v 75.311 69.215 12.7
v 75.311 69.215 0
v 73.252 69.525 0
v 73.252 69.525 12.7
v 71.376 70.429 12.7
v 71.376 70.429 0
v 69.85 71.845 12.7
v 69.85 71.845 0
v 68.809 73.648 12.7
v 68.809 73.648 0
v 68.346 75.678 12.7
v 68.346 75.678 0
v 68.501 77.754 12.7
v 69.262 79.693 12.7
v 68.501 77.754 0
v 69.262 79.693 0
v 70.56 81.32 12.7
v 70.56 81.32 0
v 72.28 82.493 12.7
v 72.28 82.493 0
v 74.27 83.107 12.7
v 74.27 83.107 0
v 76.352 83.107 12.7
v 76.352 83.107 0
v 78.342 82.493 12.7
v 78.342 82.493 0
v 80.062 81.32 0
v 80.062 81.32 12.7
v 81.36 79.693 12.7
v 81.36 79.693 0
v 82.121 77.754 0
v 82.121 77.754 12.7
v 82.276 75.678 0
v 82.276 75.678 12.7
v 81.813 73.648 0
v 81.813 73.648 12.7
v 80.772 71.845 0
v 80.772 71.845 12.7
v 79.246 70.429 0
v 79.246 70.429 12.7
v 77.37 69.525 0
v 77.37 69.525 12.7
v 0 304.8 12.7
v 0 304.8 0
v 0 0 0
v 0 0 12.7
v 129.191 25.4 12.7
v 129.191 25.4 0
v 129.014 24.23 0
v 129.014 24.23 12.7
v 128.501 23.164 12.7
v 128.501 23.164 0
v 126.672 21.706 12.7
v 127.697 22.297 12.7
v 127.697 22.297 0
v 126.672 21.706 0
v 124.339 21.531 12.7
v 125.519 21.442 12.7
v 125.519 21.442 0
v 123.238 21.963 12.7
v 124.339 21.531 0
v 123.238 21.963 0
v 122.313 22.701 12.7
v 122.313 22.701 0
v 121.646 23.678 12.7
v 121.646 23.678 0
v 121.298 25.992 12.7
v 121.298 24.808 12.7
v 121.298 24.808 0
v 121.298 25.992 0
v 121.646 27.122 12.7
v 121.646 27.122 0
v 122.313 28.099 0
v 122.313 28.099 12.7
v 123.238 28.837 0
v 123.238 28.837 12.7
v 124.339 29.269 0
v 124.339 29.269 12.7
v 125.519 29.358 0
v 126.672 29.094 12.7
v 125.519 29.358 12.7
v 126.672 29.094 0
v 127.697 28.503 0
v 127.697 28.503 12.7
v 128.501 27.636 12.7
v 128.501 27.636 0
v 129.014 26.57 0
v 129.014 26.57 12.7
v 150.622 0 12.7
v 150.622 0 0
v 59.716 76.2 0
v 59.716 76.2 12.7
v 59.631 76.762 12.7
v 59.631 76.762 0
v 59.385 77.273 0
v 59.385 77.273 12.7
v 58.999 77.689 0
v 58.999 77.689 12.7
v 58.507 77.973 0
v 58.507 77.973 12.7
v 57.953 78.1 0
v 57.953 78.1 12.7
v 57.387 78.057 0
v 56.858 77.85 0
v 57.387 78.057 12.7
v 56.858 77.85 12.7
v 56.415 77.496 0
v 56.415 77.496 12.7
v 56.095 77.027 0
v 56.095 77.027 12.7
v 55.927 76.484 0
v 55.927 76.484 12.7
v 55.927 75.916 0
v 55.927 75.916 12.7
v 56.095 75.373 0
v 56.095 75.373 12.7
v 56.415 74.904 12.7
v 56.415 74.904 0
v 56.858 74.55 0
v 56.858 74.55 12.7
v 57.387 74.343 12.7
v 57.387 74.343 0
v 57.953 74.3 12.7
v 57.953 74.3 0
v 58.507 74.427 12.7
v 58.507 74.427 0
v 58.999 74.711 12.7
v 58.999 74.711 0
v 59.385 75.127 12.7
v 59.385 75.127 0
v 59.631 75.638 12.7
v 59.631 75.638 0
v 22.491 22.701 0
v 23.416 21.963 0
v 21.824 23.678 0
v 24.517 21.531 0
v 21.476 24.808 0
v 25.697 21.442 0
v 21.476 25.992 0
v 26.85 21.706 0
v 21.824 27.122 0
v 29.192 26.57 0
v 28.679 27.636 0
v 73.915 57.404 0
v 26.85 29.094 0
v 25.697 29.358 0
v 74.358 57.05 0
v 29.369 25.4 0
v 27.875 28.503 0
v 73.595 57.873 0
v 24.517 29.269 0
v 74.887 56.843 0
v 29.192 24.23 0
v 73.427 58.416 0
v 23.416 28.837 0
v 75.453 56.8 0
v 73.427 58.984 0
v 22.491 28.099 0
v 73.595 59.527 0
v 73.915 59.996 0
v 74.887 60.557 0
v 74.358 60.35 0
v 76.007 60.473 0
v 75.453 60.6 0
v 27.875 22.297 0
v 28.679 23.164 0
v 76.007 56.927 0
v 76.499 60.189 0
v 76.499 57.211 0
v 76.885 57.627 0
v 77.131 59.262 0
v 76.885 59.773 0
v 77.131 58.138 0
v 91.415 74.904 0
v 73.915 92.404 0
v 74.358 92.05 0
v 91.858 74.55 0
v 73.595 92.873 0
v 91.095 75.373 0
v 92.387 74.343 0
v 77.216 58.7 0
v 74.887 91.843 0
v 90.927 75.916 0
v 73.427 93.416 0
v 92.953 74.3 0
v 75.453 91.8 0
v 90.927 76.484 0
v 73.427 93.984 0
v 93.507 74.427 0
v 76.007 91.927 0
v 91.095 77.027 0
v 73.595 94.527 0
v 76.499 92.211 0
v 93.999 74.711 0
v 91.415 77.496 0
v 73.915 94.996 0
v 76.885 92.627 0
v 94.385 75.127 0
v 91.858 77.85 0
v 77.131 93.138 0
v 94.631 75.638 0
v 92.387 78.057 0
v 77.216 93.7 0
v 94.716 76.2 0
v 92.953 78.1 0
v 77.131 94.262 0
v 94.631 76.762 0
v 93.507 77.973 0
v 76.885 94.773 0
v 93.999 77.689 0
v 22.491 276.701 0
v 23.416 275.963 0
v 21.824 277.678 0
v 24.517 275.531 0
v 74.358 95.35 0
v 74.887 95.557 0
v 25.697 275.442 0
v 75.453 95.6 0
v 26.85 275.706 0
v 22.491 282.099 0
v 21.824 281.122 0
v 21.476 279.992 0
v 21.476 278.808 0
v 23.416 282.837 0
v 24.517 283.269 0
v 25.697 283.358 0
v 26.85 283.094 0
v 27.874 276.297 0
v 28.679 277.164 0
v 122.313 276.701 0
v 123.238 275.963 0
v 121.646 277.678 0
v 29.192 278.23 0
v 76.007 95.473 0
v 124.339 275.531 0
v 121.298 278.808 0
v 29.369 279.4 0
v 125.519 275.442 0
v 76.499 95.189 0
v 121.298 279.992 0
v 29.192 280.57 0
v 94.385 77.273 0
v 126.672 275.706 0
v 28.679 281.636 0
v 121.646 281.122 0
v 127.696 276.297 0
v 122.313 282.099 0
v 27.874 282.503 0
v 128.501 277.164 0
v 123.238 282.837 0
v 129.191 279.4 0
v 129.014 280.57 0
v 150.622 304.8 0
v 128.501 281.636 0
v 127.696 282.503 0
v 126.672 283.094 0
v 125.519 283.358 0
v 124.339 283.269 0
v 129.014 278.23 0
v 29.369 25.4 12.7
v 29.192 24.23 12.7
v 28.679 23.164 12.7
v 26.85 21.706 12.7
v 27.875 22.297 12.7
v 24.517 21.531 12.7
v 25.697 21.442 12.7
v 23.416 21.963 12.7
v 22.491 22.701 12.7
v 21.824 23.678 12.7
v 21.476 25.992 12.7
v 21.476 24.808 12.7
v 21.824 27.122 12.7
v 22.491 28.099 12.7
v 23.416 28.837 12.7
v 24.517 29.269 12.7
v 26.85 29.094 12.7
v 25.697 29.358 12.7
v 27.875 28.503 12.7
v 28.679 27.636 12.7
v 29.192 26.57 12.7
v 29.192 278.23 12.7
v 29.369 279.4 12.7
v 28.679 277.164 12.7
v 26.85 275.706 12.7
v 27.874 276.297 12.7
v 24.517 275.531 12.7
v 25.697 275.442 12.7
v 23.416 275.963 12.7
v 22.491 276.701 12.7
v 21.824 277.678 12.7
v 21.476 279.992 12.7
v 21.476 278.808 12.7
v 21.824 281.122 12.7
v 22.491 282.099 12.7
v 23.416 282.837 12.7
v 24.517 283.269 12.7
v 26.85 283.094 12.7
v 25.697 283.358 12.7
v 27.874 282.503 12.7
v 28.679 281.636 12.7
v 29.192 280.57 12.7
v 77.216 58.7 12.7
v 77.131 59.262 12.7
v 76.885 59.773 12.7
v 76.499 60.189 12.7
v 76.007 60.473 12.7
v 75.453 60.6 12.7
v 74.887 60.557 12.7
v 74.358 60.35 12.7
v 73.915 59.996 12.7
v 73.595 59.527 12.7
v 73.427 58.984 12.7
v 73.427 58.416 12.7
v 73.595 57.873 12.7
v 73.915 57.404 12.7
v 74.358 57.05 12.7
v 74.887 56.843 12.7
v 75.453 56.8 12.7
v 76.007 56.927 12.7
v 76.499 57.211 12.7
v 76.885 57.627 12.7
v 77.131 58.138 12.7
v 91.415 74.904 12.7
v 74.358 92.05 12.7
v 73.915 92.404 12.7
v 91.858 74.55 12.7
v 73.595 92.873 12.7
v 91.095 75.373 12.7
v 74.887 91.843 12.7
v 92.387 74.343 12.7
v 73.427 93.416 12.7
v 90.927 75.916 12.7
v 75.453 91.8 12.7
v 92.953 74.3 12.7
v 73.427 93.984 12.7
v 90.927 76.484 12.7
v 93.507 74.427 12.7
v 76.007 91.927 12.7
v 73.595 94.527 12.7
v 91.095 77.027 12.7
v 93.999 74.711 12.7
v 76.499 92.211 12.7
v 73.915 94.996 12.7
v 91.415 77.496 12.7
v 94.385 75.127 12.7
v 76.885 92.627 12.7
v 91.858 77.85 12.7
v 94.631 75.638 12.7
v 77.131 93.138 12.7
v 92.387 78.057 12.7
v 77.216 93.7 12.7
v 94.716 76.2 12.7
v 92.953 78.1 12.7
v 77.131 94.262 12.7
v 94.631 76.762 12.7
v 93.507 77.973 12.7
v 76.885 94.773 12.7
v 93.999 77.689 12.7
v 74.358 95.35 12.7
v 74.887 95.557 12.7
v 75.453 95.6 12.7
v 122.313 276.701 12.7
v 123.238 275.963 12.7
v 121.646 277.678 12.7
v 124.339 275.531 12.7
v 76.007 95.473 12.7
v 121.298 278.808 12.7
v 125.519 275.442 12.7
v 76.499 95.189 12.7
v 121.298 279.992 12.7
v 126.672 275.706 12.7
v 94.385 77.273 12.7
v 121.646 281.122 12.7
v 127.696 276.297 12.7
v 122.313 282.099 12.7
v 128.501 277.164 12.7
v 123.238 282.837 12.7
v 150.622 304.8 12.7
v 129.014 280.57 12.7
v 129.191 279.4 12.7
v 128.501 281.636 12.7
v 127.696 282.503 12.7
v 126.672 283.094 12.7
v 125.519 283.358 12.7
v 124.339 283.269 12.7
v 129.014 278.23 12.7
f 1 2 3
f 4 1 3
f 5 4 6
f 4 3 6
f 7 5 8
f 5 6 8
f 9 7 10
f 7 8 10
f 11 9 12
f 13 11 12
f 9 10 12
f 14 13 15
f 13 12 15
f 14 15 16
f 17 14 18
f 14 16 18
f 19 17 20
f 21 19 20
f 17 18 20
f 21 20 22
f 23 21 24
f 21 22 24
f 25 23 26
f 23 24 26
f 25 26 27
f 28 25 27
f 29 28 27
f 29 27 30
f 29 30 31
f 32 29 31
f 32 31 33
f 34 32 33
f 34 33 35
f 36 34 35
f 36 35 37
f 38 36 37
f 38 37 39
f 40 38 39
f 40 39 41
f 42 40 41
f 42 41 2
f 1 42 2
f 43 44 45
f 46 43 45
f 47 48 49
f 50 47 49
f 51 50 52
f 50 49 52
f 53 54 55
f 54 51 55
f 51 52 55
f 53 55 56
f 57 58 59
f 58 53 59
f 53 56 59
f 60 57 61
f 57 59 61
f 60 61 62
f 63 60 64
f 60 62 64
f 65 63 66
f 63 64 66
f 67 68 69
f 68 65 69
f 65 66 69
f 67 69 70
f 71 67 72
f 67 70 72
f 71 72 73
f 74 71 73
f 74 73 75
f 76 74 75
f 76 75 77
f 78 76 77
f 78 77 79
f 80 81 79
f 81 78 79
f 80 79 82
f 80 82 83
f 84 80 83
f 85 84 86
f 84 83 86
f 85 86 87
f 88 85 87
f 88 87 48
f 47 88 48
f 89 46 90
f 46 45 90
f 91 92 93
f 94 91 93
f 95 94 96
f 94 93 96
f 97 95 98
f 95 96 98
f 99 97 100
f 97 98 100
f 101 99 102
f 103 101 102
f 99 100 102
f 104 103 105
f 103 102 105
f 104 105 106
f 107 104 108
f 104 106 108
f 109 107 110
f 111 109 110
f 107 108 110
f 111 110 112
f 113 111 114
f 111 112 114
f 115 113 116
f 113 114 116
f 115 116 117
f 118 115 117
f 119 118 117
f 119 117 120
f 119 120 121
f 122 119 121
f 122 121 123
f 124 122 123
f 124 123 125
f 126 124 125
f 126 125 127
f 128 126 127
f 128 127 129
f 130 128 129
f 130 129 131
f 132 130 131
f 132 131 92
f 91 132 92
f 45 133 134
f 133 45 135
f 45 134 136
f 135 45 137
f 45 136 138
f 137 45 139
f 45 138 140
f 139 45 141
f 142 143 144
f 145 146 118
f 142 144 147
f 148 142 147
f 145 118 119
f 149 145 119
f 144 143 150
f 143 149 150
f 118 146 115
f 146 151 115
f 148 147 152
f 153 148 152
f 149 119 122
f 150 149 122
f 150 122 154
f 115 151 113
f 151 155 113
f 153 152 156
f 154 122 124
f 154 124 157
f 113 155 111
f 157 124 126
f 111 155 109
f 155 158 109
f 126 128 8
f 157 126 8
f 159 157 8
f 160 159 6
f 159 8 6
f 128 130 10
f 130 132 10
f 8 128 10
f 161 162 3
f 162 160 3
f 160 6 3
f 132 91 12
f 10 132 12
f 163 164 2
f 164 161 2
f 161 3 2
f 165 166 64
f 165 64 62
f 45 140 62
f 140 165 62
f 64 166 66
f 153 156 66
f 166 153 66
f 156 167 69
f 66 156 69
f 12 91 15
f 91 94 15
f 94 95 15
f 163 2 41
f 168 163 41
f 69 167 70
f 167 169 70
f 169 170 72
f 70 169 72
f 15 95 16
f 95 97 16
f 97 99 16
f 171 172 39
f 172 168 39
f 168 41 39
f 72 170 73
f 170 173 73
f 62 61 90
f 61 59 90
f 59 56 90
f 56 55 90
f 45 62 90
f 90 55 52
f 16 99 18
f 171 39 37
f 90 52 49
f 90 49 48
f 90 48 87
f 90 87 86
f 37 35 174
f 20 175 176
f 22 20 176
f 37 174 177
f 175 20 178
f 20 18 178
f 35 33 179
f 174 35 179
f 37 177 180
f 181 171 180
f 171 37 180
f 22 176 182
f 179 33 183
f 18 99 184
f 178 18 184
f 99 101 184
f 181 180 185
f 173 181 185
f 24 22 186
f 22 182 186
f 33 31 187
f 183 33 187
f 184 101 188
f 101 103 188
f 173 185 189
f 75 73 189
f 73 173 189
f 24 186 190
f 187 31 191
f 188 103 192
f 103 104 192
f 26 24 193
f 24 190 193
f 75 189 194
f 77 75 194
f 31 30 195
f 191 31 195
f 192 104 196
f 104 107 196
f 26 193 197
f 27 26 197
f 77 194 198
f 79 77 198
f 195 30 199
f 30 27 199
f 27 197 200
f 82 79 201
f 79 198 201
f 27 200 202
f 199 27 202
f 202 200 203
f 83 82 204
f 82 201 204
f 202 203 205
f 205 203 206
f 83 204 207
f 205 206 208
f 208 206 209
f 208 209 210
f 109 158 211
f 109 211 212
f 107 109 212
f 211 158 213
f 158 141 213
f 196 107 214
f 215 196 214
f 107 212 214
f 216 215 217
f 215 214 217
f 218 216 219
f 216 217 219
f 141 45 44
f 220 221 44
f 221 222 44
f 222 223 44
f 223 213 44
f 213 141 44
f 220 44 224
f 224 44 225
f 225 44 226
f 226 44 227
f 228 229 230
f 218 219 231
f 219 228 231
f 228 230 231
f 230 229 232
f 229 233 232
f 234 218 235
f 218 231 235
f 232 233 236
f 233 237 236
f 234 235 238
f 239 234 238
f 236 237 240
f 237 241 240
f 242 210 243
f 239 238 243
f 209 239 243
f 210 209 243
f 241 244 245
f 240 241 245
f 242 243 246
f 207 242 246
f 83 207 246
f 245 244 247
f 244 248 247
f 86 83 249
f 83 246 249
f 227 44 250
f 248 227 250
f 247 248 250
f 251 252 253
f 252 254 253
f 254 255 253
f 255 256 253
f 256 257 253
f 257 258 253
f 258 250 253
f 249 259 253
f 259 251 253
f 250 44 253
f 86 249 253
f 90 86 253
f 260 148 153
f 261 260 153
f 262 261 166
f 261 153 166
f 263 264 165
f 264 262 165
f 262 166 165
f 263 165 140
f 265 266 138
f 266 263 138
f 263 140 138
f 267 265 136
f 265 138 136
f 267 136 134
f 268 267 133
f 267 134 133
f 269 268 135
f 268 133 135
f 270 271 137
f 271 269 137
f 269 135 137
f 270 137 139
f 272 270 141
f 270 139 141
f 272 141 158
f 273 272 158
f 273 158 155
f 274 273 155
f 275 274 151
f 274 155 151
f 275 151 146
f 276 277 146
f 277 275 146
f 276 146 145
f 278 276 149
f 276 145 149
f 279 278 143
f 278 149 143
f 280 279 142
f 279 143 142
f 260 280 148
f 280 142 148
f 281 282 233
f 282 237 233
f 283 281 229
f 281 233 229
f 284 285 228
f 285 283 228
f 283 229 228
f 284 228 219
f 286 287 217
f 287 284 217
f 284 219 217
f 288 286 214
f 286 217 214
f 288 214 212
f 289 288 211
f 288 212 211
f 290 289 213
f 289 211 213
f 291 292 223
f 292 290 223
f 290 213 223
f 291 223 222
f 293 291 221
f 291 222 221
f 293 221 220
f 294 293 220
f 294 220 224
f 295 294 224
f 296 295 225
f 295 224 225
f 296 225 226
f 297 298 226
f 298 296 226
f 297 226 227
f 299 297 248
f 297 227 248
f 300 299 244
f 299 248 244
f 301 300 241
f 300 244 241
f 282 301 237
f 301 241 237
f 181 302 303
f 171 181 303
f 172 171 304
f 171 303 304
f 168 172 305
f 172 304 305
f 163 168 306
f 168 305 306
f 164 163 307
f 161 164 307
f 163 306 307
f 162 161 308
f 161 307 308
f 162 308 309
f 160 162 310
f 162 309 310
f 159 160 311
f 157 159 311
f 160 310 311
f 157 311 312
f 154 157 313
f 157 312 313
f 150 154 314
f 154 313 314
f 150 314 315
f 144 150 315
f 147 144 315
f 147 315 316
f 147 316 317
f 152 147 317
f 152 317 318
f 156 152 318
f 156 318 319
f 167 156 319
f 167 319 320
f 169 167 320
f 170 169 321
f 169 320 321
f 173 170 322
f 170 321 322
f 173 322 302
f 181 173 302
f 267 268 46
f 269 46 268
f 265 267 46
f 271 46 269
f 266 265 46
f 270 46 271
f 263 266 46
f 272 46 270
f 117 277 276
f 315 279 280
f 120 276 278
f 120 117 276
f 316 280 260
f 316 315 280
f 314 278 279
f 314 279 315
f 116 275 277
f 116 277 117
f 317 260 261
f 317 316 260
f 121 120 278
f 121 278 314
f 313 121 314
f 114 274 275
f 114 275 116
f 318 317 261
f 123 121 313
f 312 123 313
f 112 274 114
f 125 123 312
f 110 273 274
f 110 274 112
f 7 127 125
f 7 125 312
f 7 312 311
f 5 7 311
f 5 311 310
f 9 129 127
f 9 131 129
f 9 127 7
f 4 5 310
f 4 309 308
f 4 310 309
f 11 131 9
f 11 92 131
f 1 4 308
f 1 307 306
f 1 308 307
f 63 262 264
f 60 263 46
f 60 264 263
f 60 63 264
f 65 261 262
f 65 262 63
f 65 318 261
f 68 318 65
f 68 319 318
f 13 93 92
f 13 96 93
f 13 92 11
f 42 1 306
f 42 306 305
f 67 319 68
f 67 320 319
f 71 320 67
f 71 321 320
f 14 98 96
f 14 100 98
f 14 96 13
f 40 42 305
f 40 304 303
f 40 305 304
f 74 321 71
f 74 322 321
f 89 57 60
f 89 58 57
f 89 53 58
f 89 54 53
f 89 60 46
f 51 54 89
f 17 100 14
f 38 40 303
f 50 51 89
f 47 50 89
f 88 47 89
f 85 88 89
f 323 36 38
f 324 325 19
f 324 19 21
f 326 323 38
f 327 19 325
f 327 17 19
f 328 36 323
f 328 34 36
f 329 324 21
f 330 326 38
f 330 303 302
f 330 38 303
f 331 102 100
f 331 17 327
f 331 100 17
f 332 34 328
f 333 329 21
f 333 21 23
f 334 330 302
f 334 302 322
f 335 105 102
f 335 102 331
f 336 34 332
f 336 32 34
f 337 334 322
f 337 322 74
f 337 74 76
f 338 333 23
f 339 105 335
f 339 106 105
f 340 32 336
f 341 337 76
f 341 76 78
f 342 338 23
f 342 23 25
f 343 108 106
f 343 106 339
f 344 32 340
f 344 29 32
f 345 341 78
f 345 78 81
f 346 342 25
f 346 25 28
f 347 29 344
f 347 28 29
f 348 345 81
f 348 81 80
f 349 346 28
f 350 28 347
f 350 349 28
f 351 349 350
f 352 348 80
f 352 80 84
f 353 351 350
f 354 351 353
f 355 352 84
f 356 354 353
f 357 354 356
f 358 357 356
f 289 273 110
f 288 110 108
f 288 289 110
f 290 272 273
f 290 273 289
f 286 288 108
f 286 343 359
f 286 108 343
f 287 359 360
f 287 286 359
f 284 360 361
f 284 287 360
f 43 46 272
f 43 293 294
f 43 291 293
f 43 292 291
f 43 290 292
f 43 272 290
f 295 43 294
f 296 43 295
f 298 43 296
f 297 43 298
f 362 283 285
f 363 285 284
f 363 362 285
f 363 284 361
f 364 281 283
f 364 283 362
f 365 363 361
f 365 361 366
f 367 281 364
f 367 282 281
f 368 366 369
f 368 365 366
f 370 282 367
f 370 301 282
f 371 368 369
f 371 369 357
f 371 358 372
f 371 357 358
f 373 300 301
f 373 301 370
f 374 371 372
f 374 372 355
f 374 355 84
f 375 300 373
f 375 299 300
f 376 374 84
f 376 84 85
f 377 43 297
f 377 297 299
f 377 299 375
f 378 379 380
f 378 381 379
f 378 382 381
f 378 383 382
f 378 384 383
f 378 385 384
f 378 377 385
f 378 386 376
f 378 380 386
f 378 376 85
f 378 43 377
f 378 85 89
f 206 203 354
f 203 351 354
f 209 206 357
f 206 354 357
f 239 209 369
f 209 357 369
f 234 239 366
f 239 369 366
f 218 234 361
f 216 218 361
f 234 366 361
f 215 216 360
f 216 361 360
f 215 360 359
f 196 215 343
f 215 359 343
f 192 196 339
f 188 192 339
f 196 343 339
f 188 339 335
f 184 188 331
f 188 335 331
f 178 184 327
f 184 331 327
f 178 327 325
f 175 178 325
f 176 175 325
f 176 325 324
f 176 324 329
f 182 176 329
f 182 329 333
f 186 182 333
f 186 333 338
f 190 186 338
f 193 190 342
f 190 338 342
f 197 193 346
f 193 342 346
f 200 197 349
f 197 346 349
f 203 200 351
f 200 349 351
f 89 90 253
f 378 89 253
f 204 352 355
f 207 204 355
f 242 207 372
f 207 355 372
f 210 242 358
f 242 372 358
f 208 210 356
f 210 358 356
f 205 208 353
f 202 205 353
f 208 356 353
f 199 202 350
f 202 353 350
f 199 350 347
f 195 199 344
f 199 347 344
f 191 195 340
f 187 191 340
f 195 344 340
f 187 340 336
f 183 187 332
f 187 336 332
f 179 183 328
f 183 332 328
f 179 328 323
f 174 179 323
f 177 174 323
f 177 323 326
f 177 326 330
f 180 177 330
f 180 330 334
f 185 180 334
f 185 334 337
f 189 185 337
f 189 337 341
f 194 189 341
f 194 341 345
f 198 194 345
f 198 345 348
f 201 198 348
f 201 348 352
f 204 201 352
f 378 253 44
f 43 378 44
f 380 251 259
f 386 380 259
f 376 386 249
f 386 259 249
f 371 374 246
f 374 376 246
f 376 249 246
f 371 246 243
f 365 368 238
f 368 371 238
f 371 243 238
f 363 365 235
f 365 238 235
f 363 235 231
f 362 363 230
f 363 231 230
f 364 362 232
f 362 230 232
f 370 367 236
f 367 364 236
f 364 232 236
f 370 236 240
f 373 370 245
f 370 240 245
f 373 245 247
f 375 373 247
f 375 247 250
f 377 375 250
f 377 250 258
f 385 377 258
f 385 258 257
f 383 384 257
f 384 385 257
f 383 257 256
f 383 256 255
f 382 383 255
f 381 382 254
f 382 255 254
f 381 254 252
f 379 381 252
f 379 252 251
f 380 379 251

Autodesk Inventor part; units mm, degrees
ref_plane "YZ Plane" through (0, 0, 0) normal (1, 0, 0) x (0, 1, 0)
ref_plane "XZ Plane" through (0, 0, 0) normal (0, 1, 0) x (-1, 0, 0)
ref_plane "XY Plane" through (0, 0, 0) normal (0, 0, 1) x (1, 0, 0)
sketch "Sketch1" plane through (0, 0, 0) normal (0, 0, 1) x (1, 0, 0)
  point P0 (0, 0)
sketch "Sketch2" plane through (0, 0, 0) normal (0, 0, 1) x (1, 0, 0)
  line L0 (0, 0) -> (150.622, 0)
  line L1 (150.622, 0) -> (150.622, 304.8)
  line L2 (150.622, 304.8) -> (0, 304.8)
  line L3 (0, 304.8) -> (0, 0)
  circle A0 centre (25.4, 279.4) radius 3.9687
  circle A1 centre (125.222, 279.4) radius 3.9687
  circle A2 centre (25.4, 25.4) radius 3.9688
  circle A3 centre (125.222, 25.4) radius 3.9688
  dimension "d0" = 150.622
  dimension "d1" = 304.8
  dimension "d2" = 7.9375
  dimension "d3" = 25.4
  dimension "d4" = 25.4
  dimension "d5" = 7.9375
  dimension "d6" = 25.4
  dimension "d7" = 25.4
  dimension "d8" = 7.9375
  dimension "d9" = 25.4
  dimension "d10" = 25.4
  dimension "d11" = 7.9375
  dimension "d12" = 25.4
  dimension "d13" = 25.4
extrude "Extrusion1" add sketch "Sketch2" along normal blind 12.7
sketch "Sketch3" plane through (0, 0, 12.7) normal (0, 0, 1) x (1, 0, 0)
  line L0 (150.622, 304.8) -> (0, 304.8) projected
  line L1 (0, 0) -> (150.622, 0) projected
  line L2 (0, 304.8) -> (0, 0) projected
  line L3 (150.622, 0) -> (150.622, 304.8) projected
  circle A0 centre (57.811, 76.2) radius 1.905
  circle A1 centre (75.311, 93.7) radius 1.905
  circle A2 centre (75.311, 58.7) radius 1.905
  circle A3 centre (92.811, 76.2) radius 1.905
  point P0 (75.311, 76.2)
  dimension "d16" = 228.6
  dimension "d17" = 76.2
  dimension "d18" = 75.311
  dimension "d19" = 75.311
  dimension "d31" = 3.81
  dimension "d32" = 3.81
  dimension "d33" = 3.81
  dimension "d34" = 3.81
  dimension "d45" = 34.9999
  dimension "d46" = 17.5
  dimension "d47" = 17.5
  dimension "d48" = 17.5
hole "Hole1" at (75.311, 76.2, 12.7) direction (0, 0, -1) diameter 13.97 end through all
extrude "Extrusion2" cut sketch "Sketch3" against normal blind 25.4 contours A0 | A1 | A2 | A3
